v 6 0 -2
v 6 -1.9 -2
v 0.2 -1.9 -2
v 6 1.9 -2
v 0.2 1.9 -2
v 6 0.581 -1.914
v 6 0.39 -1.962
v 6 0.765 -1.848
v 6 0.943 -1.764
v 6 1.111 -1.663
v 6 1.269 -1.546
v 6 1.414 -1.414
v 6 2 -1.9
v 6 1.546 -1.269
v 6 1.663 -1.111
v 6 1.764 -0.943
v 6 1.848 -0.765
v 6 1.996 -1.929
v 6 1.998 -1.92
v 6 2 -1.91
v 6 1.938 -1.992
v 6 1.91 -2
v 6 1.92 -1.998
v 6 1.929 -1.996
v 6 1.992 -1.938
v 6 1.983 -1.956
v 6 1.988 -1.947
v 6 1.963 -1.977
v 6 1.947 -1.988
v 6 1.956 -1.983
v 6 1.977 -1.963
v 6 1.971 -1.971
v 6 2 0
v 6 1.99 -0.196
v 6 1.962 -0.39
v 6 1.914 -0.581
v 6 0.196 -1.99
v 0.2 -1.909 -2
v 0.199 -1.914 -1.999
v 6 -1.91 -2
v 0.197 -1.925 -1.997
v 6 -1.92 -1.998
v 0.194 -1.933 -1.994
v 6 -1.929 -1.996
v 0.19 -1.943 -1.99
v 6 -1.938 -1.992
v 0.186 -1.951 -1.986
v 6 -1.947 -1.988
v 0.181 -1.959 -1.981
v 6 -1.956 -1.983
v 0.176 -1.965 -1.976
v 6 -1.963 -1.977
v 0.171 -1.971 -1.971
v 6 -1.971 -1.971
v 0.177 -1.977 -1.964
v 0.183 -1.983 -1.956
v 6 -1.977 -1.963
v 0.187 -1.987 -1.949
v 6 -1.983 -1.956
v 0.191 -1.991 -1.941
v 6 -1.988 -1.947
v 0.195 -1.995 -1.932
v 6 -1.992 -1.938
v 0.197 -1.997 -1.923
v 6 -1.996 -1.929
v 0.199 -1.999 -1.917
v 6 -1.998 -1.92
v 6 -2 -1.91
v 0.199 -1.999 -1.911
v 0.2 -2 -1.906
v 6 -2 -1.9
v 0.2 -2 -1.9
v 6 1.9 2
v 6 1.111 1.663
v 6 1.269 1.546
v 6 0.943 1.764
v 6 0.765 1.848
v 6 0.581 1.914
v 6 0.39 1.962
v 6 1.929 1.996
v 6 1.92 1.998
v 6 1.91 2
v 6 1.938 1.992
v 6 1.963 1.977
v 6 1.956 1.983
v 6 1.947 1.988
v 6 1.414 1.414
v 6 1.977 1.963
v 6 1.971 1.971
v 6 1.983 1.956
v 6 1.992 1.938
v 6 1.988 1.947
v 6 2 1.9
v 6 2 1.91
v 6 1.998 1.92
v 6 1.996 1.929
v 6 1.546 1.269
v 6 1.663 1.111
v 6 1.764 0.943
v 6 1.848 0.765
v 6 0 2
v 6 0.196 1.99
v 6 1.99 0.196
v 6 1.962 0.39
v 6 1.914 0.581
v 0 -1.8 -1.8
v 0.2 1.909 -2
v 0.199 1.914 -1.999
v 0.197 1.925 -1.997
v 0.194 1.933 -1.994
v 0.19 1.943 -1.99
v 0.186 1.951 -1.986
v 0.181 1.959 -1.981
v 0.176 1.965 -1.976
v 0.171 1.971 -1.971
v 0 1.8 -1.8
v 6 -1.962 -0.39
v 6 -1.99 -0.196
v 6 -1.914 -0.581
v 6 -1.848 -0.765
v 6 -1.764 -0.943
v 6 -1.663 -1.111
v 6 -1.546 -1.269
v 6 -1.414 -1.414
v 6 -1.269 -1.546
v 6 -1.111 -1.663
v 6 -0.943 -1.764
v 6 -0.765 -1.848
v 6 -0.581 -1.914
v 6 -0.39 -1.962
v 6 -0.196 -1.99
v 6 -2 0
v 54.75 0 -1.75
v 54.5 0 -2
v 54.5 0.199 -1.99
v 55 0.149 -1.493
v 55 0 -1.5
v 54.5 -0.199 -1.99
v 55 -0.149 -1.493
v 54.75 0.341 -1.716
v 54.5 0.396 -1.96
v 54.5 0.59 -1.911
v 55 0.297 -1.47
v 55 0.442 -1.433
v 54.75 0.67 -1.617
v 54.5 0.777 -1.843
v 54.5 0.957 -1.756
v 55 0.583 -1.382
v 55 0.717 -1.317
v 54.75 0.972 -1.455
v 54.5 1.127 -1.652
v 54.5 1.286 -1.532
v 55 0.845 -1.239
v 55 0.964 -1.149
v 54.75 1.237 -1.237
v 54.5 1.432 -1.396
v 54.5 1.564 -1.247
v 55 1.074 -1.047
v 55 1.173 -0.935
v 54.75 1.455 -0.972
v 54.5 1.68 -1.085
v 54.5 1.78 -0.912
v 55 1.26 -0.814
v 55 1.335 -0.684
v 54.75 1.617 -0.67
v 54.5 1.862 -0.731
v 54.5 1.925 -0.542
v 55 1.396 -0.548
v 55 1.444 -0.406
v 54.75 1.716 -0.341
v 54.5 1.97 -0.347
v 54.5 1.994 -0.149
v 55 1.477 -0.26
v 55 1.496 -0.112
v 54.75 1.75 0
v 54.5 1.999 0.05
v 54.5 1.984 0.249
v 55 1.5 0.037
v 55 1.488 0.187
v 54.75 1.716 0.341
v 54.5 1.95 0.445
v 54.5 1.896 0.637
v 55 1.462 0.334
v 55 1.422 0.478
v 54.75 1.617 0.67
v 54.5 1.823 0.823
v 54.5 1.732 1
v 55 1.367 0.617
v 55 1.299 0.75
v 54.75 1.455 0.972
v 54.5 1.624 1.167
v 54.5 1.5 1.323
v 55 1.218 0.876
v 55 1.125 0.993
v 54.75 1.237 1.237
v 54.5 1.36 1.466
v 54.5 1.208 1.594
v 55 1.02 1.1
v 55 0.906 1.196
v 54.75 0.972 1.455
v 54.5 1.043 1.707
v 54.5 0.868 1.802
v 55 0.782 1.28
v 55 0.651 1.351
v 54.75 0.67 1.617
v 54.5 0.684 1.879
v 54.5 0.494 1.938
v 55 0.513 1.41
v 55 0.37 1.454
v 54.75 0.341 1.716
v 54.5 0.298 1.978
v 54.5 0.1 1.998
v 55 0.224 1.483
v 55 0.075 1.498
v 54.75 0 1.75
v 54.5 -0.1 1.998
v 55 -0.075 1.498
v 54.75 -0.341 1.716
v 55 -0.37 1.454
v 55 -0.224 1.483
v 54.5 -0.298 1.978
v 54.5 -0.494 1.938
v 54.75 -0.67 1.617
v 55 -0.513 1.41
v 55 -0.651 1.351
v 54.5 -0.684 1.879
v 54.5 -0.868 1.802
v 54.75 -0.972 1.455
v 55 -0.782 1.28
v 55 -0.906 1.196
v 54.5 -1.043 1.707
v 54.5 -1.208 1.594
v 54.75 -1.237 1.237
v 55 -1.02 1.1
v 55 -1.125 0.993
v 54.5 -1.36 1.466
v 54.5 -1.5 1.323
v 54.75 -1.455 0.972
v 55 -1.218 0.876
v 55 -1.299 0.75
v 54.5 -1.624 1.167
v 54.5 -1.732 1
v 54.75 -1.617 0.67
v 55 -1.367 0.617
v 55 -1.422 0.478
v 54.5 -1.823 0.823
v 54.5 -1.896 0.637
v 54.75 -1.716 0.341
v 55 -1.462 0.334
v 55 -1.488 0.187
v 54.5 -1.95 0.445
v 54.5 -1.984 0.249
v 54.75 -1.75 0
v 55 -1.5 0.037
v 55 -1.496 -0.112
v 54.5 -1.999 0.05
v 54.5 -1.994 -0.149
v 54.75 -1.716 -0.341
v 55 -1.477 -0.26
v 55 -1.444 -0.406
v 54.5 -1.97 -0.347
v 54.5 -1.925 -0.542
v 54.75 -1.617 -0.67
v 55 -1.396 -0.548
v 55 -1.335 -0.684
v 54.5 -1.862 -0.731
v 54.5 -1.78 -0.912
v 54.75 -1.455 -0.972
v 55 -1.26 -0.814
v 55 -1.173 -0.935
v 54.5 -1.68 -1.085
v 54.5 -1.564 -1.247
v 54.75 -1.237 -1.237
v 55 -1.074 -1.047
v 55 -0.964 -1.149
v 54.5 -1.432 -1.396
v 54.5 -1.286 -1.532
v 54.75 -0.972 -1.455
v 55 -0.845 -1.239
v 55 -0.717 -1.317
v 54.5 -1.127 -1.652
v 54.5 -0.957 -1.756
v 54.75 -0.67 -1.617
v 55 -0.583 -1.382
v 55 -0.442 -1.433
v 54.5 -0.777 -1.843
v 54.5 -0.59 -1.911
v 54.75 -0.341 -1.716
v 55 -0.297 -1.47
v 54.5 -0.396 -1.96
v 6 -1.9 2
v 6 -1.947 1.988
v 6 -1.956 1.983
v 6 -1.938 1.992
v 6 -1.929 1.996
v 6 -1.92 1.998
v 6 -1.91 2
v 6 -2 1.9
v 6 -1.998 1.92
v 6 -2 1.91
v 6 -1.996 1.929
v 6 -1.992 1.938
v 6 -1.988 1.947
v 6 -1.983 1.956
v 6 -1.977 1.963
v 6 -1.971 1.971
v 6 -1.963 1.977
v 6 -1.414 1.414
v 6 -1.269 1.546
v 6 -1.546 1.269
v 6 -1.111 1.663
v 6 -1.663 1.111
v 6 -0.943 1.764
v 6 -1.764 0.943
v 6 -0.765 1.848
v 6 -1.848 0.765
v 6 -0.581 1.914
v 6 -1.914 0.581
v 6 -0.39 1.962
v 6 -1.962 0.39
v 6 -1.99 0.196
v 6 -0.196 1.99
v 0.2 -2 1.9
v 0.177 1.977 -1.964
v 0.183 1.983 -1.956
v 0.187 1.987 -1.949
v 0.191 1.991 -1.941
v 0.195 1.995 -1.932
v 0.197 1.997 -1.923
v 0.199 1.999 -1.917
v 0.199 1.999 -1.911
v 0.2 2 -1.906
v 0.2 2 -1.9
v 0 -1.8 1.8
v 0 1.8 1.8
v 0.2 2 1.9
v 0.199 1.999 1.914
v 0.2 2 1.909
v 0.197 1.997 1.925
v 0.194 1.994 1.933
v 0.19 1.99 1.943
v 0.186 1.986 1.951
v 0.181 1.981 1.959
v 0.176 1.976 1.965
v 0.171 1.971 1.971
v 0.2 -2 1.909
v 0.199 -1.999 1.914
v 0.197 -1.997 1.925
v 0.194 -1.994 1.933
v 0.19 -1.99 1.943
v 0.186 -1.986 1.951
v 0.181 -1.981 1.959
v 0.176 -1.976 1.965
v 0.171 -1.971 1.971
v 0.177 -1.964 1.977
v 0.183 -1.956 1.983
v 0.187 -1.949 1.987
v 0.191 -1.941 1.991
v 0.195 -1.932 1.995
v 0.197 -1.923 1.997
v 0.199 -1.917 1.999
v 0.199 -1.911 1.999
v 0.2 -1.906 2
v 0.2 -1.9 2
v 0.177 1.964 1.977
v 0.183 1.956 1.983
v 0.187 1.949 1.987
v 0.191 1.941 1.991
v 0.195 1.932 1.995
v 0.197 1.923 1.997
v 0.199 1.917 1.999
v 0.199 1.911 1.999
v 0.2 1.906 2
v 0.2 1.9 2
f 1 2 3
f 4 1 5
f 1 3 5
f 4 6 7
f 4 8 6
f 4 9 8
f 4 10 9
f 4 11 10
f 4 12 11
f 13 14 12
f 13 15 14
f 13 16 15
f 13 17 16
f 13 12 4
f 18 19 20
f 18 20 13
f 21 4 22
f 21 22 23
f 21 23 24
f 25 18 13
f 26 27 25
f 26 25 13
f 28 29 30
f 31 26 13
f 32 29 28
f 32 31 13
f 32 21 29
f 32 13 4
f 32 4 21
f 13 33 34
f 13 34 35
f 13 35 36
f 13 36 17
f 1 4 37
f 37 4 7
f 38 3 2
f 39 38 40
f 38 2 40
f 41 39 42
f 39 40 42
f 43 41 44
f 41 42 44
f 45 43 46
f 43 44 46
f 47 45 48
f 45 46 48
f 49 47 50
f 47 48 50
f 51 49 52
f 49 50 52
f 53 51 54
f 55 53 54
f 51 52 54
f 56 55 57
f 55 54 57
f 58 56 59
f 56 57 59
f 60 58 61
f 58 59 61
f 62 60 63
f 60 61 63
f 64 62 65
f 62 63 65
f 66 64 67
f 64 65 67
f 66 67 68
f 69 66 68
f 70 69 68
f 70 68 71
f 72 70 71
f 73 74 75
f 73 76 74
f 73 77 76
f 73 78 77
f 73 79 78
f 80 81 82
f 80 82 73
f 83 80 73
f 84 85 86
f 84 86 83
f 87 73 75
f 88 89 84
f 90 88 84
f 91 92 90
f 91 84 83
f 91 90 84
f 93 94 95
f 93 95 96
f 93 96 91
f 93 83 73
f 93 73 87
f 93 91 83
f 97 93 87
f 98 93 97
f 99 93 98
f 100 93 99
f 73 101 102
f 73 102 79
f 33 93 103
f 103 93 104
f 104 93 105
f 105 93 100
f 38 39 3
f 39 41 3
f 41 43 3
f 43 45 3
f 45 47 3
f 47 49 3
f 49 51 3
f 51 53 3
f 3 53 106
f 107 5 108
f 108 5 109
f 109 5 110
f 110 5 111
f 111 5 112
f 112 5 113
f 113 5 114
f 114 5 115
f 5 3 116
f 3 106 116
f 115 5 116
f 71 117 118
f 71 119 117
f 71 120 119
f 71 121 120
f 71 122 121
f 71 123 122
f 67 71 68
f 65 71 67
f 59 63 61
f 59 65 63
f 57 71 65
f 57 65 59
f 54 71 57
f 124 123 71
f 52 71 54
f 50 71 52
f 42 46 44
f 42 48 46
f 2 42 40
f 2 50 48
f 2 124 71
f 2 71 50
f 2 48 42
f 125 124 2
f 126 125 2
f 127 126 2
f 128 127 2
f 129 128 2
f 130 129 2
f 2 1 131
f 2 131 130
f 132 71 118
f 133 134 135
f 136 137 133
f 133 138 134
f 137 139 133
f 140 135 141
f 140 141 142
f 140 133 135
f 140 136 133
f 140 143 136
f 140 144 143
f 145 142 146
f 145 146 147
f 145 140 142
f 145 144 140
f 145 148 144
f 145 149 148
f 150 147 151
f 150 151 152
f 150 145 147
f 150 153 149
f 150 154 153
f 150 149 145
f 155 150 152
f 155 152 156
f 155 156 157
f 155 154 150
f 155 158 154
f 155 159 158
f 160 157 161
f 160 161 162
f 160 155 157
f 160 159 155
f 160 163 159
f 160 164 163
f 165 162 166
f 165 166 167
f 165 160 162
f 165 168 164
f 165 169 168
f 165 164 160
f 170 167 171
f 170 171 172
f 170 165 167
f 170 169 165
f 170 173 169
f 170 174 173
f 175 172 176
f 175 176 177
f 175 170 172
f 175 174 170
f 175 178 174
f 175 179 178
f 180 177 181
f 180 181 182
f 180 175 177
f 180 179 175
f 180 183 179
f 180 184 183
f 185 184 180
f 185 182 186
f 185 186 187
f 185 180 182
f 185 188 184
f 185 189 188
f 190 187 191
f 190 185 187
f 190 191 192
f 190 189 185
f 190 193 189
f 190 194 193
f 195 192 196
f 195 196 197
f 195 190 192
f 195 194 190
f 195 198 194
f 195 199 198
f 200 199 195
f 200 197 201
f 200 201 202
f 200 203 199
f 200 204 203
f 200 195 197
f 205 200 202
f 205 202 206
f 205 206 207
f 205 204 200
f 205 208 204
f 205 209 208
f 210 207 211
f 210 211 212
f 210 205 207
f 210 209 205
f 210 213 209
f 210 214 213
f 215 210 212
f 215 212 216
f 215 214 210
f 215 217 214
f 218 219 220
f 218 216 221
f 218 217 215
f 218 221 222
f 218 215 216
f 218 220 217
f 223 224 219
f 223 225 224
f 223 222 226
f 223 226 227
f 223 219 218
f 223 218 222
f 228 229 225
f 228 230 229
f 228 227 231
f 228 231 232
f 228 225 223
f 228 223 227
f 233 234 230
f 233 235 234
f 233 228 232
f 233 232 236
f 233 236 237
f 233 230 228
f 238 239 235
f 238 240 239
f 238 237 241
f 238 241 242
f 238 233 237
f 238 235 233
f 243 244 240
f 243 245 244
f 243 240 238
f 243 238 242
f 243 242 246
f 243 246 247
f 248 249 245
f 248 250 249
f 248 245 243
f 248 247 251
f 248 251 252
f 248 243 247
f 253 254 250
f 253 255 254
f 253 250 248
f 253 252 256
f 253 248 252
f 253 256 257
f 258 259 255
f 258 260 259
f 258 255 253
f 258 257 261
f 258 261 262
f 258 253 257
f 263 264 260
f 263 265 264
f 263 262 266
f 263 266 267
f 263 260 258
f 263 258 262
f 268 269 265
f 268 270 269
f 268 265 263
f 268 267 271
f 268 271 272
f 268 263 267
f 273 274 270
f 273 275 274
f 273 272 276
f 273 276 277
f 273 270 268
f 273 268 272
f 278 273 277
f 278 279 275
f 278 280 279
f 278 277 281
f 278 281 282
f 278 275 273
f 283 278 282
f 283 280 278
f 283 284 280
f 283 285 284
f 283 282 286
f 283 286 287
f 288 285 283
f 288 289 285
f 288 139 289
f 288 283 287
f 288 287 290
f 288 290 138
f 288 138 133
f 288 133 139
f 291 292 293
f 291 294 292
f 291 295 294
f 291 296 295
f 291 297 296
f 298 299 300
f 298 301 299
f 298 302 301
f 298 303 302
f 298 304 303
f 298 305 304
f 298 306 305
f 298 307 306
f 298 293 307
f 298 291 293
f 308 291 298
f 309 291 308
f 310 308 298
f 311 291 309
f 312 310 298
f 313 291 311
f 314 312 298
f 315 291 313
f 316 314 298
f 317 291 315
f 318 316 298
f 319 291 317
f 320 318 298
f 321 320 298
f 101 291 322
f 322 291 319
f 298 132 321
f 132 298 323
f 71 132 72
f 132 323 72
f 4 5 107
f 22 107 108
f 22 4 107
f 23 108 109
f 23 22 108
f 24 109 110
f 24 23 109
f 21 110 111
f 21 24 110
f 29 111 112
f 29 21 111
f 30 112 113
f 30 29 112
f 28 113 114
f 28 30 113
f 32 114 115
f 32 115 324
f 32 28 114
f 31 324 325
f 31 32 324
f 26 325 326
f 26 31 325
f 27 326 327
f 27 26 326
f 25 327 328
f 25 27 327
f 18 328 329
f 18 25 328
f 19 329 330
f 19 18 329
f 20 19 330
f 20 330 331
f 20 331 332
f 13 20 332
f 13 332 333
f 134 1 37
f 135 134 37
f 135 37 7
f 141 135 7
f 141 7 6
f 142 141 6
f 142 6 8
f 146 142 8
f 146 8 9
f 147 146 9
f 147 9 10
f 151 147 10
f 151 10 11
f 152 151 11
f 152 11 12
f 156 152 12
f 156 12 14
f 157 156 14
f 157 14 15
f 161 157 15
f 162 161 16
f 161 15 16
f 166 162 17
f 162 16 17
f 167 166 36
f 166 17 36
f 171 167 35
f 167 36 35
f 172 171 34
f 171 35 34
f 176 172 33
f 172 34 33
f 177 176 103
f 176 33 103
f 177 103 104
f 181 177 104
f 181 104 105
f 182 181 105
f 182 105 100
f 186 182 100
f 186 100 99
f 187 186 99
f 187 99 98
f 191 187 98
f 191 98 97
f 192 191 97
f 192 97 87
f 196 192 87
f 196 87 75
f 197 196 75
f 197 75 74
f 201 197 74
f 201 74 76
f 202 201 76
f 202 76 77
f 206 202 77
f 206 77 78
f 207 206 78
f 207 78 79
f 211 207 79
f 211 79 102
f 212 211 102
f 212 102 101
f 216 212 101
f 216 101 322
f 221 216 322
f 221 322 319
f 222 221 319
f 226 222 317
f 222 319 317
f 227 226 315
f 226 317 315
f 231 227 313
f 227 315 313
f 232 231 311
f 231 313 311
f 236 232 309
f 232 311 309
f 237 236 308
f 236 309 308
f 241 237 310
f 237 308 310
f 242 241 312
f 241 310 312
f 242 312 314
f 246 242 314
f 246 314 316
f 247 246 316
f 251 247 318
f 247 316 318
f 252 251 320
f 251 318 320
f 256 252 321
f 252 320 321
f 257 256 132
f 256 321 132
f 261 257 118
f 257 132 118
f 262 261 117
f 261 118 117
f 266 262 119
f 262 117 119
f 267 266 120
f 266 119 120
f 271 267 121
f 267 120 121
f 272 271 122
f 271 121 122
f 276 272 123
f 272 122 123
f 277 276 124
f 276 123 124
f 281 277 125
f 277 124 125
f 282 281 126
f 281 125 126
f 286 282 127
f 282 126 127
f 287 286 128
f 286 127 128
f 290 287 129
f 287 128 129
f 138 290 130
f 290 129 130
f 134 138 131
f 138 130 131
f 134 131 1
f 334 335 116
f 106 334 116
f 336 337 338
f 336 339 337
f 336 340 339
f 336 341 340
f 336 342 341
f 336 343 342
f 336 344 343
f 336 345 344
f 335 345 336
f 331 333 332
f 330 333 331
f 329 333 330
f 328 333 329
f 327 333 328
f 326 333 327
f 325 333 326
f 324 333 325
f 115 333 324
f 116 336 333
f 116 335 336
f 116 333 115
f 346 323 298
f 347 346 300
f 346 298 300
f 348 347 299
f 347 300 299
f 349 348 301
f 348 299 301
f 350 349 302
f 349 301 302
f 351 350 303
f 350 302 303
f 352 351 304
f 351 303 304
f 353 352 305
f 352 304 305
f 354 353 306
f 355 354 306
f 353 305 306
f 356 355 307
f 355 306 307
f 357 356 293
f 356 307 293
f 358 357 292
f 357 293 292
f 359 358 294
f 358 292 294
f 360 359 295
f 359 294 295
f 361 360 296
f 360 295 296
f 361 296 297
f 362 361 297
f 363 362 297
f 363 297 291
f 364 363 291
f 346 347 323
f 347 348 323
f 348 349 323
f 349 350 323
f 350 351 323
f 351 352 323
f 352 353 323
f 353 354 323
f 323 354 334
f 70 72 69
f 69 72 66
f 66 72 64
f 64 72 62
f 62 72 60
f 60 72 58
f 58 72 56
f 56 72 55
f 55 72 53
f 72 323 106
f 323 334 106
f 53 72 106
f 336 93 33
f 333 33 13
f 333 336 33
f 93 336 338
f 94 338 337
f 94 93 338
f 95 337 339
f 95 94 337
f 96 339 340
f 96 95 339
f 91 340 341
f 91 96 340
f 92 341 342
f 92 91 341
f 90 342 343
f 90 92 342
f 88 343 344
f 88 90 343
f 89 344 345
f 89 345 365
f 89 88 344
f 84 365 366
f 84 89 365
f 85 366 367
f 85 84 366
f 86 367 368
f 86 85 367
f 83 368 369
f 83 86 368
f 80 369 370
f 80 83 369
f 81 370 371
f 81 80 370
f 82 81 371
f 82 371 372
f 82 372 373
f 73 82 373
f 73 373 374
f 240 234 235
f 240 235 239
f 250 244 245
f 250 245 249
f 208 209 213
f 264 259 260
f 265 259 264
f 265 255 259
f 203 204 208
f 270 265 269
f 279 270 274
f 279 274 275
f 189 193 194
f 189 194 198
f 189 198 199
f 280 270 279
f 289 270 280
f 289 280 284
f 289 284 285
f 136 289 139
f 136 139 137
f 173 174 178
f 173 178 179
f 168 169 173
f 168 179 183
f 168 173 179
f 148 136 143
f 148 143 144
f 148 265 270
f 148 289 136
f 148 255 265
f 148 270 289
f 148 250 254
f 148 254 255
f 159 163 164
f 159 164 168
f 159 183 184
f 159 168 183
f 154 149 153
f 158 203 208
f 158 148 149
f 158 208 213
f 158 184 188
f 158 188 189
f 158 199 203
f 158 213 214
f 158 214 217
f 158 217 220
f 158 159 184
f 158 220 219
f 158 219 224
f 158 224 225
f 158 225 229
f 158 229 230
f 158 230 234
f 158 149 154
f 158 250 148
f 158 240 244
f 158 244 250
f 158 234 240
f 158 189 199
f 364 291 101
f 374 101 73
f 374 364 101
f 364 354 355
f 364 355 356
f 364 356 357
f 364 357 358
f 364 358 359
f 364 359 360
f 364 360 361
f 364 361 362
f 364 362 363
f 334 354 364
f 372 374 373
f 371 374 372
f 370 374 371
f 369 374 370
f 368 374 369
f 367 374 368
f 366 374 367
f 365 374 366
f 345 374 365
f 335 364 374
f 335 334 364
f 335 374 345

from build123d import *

# Parameters (mm, degrees)
SKETCH_1_W      = 4
SKETCH_1_H      = 4
EXTRUDE_1_DEPTH = 6
SKETCH_2_R      = 2
EXTRUDE_2_DEPTH = 49
CHAMFER_1_SIZE  = 0.5
CHAMFER_2_SIZE  = 0.2
FILLET_1_R      = 0.1


with BuildPart() as part:
    # 草图1 → 凸台-拉伸1 (new body)
    with BuildSketch(Plane(origin=(0, 0, 0), x_dir=(0, 0, -1), z_dir=(1, 0, 0))):
        Rectangle(SKETCH_1_W, SKETCH_1_H)
    extrude(amount=EXTRUDE_1_DEPTH)

    # 草图2 → 凸台-拉伸2 (add)
    with BuildSketch(Plane(origin=(6, 0, 0), x_dir=(0, 0, -1), z_dir=(1, 0, 0))):
        Circle(SKETCH_2_R)
    extrude(amount=EXTRUDE_2_DEPTH)

    # 倒角1
    chamfer_1_edges = [part.edges().sort_by_distance(p)[0] for p in [
        (55, 0, 2),
    ]]
    chamfer(chamfer_1_edges, length=CHAMFER_1_SIZE)

    # 倒角2
    chamfer_2_edges = [part.edges().sort_by_distance(p)[0] for p in [
        (0, 0, 2),
        (0, 2, 0),
        (0, 0, -2),
        (0, -2, 0),
    ]]
    chamfer(chamfer_2_edges, length=CHAMFER_2_SIZE)

    # 圆角1
    fillet_1_edges = [part.edges().sort_by_distance(p)[0] for p in [
        (3.1, -2, 2),
        (3.1, 2, 2),
        (3.1, 2, -2),
        (3.1, -2, -2),
    ]]
    fillet(fillet_1_edges, radius=FILLET_1_R)


solid = part.part
